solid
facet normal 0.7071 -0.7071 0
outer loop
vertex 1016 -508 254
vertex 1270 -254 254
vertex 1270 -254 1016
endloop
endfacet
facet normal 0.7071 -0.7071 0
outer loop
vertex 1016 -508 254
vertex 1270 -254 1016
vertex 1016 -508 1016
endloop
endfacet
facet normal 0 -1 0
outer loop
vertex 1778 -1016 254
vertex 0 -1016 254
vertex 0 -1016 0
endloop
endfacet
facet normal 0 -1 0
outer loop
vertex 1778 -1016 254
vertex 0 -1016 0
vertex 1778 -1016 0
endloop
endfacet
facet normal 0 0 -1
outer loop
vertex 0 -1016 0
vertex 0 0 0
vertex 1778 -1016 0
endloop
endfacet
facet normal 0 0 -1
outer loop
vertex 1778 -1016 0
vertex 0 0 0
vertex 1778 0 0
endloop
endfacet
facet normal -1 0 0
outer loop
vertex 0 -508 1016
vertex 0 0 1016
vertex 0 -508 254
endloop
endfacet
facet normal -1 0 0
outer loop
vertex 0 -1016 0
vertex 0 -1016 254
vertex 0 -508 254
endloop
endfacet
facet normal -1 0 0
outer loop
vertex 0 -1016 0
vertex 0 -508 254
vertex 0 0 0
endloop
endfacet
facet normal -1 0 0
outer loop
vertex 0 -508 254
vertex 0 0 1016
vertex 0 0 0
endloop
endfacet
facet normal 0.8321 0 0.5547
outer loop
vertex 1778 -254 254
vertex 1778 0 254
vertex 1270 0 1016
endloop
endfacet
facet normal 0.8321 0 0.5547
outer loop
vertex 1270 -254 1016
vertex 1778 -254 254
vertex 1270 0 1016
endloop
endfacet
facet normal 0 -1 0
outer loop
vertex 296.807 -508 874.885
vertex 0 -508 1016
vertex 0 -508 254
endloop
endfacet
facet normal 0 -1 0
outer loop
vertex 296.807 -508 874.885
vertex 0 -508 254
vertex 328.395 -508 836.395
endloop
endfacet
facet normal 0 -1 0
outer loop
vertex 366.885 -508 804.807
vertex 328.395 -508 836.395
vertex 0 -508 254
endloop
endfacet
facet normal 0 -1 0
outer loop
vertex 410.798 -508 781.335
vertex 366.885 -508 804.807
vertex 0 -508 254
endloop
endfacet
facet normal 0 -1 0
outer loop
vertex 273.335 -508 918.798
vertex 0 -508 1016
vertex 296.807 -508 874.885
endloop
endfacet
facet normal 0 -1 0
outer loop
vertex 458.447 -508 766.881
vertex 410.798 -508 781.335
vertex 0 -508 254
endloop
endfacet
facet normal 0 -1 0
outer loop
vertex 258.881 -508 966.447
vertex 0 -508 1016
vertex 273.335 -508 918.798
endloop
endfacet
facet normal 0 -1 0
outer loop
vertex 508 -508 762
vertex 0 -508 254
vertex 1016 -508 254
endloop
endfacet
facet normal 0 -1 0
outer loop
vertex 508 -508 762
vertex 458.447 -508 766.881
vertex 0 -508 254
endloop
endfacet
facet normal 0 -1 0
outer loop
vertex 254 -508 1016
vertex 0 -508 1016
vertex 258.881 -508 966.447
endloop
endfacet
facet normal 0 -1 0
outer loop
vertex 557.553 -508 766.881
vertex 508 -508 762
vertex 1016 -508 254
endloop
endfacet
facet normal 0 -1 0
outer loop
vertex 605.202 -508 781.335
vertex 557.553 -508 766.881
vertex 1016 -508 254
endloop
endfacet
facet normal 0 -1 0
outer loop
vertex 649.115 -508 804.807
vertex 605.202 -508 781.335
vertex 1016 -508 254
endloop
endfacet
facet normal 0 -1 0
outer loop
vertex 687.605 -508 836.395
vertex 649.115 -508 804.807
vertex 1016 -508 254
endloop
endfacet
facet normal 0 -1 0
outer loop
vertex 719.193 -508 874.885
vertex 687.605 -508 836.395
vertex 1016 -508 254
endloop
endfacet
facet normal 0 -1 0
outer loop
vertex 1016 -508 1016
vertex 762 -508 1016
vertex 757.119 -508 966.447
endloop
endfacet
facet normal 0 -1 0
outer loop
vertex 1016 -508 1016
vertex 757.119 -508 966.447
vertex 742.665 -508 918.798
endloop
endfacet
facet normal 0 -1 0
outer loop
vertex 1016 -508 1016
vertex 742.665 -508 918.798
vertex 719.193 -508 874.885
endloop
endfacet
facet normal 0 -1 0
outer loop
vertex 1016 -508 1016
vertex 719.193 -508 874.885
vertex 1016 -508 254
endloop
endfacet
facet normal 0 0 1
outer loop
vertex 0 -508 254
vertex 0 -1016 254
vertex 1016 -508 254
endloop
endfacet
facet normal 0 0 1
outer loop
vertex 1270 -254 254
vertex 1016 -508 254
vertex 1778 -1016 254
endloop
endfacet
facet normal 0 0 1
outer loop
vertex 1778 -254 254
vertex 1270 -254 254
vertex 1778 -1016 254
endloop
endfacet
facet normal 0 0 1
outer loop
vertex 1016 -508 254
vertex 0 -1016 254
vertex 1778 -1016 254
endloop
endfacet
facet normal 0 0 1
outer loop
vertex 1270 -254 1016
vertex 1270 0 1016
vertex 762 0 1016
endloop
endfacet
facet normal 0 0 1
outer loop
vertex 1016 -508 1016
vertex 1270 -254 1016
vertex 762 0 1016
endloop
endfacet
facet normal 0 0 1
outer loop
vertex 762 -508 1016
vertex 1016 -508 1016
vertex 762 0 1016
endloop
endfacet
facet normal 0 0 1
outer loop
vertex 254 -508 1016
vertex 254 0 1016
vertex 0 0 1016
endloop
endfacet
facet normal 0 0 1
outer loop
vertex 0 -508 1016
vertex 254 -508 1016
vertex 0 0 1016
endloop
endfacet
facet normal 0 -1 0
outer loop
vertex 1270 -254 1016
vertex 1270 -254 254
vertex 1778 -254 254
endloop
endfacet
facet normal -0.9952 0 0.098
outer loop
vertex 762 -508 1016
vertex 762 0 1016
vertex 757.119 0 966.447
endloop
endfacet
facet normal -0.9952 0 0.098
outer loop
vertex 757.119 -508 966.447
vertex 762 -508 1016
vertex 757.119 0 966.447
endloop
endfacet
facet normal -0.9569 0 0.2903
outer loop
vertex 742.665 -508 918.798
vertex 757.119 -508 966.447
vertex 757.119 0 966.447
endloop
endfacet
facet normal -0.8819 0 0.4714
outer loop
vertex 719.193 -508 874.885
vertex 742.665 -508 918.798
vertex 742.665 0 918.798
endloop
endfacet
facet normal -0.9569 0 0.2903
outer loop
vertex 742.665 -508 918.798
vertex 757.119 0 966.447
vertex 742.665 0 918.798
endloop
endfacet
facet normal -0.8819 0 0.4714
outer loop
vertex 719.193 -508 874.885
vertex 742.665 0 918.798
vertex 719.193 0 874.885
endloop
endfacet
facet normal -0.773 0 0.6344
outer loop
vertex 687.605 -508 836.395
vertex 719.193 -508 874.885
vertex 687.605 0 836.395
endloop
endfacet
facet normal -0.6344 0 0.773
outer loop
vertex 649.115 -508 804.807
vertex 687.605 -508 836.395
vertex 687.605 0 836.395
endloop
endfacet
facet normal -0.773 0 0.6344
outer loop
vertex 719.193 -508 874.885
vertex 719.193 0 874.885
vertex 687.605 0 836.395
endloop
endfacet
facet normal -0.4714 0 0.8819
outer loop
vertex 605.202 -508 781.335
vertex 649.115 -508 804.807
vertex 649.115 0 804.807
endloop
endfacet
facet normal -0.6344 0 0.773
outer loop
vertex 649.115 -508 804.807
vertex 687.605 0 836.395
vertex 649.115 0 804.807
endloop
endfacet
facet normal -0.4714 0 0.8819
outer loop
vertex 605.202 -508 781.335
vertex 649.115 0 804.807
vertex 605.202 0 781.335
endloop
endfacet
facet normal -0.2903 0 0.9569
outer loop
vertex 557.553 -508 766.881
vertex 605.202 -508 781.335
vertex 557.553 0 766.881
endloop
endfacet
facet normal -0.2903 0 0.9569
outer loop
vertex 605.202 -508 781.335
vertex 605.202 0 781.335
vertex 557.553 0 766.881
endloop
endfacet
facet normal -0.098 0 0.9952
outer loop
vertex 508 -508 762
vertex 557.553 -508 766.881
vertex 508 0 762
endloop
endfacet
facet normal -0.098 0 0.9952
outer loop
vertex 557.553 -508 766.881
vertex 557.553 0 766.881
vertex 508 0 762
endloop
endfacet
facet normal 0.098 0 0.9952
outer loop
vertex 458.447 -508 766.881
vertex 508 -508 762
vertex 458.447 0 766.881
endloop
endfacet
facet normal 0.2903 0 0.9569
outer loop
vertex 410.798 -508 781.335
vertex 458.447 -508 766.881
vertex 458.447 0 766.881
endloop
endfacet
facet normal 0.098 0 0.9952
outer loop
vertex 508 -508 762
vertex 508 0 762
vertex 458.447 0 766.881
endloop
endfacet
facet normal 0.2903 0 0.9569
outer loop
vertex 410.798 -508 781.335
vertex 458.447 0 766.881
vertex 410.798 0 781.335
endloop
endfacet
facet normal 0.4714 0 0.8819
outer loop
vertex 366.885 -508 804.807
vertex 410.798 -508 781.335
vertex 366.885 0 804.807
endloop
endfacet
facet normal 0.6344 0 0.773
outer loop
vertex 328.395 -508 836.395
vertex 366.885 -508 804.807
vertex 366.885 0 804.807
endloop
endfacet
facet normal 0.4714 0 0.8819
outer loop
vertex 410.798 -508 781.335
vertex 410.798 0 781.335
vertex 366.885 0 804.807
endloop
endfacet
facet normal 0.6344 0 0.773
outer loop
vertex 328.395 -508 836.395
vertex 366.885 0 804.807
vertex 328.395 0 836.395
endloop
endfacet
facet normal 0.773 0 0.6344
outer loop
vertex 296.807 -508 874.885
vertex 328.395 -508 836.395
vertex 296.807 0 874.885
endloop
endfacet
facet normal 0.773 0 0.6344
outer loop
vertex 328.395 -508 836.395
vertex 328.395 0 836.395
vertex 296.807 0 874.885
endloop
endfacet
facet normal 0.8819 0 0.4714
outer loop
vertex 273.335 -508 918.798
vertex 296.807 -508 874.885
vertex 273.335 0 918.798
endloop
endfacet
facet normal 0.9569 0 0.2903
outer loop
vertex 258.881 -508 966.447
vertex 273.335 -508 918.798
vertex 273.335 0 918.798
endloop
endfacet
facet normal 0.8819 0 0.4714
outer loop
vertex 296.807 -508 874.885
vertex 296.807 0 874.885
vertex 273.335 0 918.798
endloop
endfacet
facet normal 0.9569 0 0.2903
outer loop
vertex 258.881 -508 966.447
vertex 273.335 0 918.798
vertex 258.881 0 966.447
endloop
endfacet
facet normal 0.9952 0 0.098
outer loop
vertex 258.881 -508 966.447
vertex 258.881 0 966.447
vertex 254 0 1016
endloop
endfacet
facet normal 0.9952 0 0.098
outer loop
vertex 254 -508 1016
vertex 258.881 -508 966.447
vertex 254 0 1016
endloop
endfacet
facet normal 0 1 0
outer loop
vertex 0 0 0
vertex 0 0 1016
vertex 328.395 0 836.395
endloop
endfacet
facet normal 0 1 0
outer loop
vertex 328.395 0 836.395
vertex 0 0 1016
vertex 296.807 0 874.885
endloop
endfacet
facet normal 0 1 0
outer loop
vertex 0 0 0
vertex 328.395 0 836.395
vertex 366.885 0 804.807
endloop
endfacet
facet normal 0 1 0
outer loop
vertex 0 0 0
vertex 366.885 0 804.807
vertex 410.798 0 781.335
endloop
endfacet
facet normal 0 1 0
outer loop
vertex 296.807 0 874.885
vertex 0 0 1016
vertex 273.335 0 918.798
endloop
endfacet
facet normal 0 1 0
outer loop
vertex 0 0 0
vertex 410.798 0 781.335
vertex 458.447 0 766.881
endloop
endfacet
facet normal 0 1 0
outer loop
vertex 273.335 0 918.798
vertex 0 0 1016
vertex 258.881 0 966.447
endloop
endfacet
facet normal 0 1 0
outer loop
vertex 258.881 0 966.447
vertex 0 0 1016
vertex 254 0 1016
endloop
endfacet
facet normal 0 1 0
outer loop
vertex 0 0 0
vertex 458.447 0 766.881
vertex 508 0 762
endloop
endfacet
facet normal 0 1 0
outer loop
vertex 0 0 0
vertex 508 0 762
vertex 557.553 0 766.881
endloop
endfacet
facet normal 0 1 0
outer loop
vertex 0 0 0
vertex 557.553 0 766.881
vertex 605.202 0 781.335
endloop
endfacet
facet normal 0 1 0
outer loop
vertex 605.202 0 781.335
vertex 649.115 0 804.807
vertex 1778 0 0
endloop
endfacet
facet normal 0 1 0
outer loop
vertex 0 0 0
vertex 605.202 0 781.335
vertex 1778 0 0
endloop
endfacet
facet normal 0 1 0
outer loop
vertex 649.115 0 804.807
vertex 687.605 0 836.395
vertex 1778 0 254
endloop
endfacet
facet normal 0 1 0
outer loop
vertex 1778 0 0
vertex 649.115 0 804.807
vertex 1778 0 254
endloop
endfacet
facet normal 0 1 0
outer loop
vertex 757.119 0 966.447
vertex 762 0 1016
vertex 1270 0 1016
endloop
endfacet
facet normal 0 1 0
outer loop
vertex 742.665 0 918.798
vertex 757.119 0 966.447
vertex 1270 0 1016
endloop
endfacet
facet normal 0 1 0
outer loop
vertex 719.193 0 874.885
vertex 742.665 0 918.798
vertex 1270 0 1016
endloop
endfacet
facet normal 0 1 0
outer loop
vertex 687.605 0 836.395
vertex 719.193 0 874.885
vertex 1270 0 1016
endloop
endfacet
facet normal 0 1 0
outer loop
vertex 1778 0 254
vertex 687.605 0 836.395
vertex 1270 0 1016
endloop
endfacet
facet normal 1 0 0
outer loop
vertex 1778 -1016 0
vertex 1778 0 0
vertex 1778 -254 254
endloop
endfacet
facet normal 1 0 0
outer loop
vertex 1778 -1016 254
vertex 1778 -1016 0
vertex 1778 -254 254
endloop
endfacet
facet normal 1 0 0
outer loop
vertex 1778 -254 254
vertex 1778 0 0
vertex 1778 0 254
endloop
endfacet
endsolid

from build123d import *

# Parameters (mm, degrees)
F0_W     = 254
F0_H     = 762
F1_DEPTH = 1016
F2_R     = 254
F3_DEPTH = 1064.26
F5_DEPTH = 508
F7_DEPTH = 254
F9_DEPTH = 762


with BuildPart() as f1:
    # F0 (on Front) → F1 (new body)
    with BuildSketch(Plane.XZ):
        with BuildLine():
            Line((0, 1016), (0, 254))
            Line((0, 254), (1016, 254))
            Line((1016, 254), (1016, 1016))
            Line((1016, 1016), (762, 1016))
            ThreePointArc((762, 1016), (508, 762), (254, 1016))
            Line((254, 1016), (0, 1016))
        make_face()
        Polygon((0, 254), (0, 0), (1778, 0), (1778, 254), (1270, 254), (1016, 254), align=None)
        with Locations((1143, 635)):
            Rectangle(F0_W, F0_H)
        Polygon((1270, 254), (1778, 254), (1270, 1016), align=None)
    extrude(amount=F1_DEPTH)

    # F2 (on face) → F3 (cut)
    with BuildSketch(Plane.XZ.offset(1016)):
        with Locations((508, 1016)):
            Circle(F2_R)
    extrude(amount=-F3_DEPTH, mode=Mode.SUBTRACT)

    # F4 (on face) → F5 (cut)
    with BuildSketch(Plane.XZ.offset(1016)):
        Polygon((1270, 254), (1270, 1016), (254, 1016), (0, 1016), (0, 254), align=None)
        Polygon((1778, 254), (1270, 1016), (1270, 254), align=None)
    extrude(amount=-F5_DEPTH, mode=Mode.SUBTRACT)

    # F6 (on face) → F7 (cut)
    with BuildSketch(Plane.XZ.offset(508)):
        Polygon((1778, 254), (1270, 1016), (1270, 254), align=None)
    extrude(amount=-F7_DEPTH, mode=Mode.SUBTRACT)

    # F8 (on face) → F9 (cut)
    with BuildSketch(Plane.XY.offset(1016)):
        Polygon((1270, -508), (1270, -254), (1016, -508), align=None)
    extrude(amount=-F9_DEPTH, mode=Mode.SUBTRACT)


solid = f1.part
